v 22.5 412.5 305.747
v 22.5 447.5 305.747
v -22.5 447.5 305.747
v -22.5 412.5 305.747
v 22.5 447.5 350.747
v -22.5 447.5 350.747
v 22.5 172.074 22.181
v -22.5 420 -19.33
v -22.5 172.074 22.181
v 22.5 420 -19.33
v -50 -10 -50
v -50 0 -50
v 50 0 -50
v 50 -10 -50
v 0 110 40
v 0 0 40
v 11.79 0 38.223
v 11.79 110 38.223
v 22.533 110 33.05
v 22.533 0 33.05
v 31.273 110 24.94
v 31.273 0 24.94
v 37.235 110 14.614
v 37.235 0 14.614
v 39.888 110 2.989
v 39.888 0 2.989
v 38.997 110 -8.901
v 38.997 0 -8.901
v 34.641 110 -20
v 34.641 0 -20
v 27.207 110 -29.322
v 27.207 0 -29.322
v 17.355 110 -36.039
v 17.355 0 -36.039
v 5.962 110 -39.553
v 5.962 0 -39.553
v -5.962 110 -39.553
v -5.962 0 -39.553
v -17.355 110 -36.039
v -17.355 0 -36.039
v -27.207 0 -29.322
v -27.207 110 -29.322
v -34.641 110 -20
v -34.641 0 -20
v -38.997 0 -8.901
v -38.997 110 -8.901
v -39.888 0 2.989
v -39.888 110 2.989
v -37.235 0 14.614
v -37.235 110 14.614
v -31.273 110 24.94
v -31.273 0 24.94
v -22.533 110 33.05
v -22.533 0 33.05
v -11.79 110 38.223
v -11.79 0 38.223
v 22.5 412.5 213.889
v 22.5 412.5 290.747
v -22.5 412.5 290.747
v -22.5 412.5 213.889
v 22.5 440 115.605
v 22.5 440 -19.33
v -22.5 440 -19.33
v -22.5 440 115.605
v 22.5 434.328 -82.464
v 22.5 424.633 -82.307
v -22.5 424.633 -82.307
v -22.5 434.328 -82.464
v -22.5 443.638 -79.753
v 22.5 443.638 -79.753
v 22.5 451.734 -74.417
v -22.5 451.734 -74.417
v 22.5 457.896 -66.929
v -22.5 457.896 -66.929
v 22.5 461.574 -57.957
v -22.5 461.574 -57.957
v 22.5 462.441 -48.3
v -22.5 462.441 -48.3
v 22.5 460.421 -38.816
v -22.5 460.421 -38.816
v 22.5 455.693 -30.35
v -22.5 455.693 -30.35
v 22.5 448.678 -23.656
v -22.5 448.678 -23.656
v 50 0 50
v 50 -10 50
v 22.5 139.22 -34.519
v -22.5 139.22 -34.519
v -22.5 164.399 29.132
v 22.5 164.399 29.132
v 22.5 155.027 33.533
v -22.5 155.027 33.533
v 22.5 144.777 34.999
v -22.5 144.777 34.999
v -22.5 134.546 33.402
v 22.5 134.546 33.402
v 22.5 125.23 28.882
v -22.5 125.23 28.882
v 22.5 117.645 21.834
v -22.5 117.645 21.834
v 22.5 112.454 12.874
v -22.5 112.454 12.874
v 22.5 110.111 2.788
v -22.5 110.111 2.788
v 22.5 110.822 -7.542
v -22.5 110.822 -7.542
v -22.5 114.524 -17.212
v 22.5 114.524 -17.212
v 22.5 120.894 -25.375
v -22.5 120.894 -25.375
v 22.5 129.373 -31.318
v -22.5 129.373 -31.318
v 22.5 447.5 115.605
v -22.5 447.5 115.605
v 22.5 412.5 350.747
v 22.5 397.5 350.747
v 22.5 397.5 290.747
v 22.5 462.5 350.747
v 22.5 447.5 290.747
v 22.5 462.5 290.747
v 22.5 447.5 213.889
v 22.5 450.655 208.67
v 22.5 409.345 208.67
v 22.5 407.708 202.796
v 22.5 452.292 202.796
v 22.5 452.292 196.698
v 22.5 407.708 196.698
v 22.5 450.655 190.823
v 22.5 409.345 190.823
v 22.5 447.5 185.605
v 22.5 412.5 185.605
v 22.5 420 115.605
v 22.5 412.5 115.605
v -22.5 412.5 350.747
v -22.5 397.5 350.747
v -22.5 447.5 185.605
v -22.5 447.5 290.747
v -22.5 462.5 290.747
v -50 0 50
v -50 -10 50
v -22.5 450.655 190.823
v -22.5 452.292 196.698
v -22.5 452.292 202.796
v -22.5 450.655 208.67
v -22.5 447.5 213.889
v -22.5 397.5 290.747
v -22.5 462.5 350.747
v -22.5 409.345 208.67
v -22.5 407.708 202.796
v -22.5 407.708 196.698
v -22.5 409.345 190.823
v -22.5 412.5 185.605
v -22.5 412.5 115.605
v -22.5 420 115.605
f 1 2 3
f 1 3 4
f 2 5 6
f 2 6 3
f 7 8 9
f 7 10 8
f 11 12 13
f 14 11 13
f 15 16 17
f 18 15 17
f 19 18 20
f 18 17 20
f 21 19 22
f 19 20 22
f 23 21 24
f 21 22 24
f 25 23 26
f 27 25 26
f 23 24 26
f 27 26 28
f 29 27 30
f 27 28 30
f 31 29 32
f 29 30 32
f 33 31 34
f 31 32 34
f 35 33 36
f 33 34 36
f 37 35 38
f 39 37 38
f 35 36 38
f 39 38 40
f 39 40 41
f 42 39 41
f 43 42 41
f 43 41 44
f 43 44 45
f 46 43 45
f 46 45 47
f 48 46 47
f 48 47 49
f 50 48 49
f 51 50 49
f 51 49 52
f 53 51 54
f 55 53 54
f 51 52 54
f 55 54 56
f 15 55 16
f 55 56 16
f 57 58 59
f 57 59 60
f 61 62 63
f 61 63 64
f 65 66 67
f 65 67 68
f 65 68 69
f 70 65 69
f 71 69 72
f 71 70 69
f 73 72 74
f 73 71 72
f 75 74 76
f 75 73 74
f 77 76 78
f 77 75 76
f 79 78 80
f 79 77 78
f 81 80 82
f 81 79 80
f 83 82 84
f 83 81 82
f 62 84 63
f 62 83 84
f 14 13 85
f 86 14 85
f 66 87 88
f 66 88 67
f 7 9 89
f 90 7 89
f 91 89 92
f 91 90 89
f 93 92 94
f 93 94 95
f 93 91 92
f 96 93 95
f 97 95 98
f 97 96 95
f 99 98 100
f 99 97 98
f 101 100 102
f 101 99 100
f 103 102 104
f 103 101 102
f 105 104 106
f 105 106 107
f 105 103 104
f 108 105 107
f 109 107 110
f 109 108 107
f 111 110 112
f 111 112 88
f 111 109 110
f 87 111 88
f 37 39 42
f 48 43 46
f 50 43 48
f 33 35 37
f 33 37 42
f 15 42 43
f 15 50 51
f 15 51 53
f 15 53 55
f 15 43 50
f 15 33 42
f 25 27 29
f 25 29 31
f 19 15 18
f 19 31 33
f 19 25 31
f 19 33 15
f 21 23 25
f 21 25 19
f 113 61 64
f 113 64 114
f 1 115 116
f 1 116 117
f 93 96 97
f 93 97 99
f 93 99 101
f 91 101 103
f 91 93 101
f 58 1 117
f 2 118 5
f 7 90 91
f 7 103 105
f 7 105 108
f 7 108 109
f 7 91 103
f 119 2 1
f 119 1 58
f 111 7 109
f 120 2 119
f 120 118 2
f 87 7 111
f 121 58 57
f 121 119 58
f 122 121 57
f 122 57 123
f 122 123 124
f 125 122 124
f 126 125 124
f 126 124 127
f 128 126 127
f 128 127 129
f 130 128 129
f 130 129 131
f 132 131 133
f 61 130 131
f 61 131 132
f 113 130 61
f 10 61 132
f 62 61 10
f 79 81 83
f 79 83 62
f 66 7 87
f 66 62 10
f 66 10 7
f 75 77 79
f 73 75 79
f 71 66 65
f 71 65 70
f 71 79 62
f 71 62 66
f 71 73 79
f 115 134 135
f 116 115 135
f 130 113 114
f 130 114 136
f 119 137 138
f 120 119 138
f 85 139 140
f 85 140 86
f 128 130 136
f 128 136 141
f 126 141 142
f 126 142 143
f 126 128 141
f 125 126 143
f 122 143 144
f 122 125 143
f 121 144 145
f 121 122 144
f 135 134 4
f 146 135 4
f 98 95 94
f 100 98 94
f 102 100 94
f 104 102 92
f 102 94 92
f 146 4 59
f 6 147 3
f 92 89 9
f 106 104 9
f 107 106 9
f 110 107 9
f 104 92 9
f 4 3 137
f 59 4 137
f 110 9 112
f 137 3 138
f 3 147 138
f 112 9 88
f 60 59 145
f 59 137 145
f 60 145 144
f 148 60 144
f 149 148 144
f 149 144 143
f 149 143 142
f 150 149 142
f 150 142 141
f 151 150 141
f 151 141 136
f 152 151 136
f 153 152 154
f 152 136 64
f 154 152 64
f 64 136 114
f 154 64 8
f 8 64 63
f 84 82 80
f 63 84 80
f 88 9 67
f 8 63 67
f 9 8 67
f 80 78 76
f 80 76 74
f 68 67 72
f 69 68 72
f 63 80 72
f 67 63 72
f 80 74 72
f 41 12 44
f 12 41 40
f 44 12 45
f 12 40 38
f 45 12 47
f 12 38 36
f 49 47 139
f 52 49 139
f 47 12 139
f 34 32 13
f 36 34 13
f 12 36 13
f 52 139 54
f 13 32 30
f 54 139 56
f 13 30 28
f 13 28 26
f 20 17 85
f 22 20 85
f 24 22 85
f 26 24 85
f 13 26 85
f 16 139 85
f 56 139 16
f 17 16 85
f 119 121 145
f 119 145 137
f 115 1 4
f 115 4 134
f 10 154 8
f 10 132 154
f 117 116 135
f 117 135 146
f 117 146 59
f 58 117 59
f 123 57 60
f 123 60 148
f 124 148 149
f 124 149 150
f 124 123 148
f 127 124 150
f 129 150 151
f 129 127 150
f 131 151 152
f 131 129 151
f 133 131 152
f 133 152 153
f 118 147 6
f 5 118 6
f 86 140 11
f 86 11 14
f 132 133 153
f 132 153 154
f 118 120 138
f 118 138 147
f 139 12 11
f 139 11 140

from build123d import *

# Parameters (mm, degrees)
SKETCH1_R           = 40
BOSS_EXTRUDE1_DEPTH = 110
SKETCH2_W           = 100
SKETCH2_H           = 100
BOSS_EXTRUDE2_DEPTH = 10
BOSS_EXTRUDE3_DEPTH = 22.5


with BuildPart() as part:
    # Sketch1 → Boss-Extrude1 (new body)
    with BuildSketch(Plane(origin=(0, 0, 0), x_dir=(1, 0, 0), z_dir=(0, 1, 0))):
        with Locations(Location((0, 0, 0), (0, 0, 270))):
            Circle(SKETCH1_R)
    extrude(amount=BOSS_EXTRUDE1_DEPTH)

    # Sketch2 → Boss-Extrude2 (add)
    with BuildSketch(Plane.XZ):
        Rectangle(SKETCH2_W, SKETCH2_H)
    extrude(amount=BOSS_EXTRUDE2_DEPTH)


with BuildPart() as body_2:
    # Sketch3 → Boss-Extrude3 (new, symmetric)
    with BuildSketch(Plane(origin=(0, 0, 0), x_dir=(0, 0, -1), z_dir=(1, 0, 0))):
        with BuildLine():
            ThreePointArc((-22.181090039, 172.073958792), (-17.54707199, 114.716336672), (34.5194883, 139.220300396))
            Line((34.5194883, 139.220300396), (82.307000066, 424.633136082))
            ThreePointArc((82.307000066, 424.633136082), (57.957386061, 461.5736497), (19.32989731, 440))
            Line((19.32989731, 440), (-115.604674874, 440))
            Line((-115.604674874, 440), (-115.604674874, 447.5))
            Line((-115.604674874, 447.5), (-185.604674874, 447.5))
            ThreePointArc((-185.604674874, 447.5), (-199.746810498, 452.5), (-213.888946122, 447.5))
            Line((-213.888946122, 447.5), (-290.746810498, 447.5))
            Line((-290.746810498, 447.5), (-290.746810498, 462.5))
            Line((-290.746810498, 462.5), (-350.746810498, 462.5))
            Line((-350.746810498, 462.5), (-350.746810498, 447.5))
            Line((-350.746810498, 447.5), (-305.746810498, 447.5))
            Line((-305.746810498, 447.5), (-305.746810498, 412.5))
            Line((-305.746810498, 412.5), (-350.746810498, 412.5))
            Line((-350.746810498, 412.5), (-350.746810498, 397.5))
            Line((-350.746810498, 397.5), (-290.746810498, 397.5))
            Line((-290.746810498, 397.5), (-290.746810498, 412.5))
            Line((-290.746810498, 412.5), (-213.888946122, 412.5))
            ThreePointArc((-213.888946122, 412.5), (-199.746810498, 407.5), (-185.604674874, 412.5))
            Line((-185.604674874, 412.5), (-115.604674874, 412.5))
            Line((-115.604674874, 412.5), (-115.604674874, 420))
            Line((-115.604674874, 420), (19.32989731, 420))
            Line((19.32989731, 420), (-22.181090039, 172.073958792))
        make_face()
    extrude(amount=BOSS_EXTRUDE3_DEPTH, both=True)


solid = Compound([part.part, body_2.part])
